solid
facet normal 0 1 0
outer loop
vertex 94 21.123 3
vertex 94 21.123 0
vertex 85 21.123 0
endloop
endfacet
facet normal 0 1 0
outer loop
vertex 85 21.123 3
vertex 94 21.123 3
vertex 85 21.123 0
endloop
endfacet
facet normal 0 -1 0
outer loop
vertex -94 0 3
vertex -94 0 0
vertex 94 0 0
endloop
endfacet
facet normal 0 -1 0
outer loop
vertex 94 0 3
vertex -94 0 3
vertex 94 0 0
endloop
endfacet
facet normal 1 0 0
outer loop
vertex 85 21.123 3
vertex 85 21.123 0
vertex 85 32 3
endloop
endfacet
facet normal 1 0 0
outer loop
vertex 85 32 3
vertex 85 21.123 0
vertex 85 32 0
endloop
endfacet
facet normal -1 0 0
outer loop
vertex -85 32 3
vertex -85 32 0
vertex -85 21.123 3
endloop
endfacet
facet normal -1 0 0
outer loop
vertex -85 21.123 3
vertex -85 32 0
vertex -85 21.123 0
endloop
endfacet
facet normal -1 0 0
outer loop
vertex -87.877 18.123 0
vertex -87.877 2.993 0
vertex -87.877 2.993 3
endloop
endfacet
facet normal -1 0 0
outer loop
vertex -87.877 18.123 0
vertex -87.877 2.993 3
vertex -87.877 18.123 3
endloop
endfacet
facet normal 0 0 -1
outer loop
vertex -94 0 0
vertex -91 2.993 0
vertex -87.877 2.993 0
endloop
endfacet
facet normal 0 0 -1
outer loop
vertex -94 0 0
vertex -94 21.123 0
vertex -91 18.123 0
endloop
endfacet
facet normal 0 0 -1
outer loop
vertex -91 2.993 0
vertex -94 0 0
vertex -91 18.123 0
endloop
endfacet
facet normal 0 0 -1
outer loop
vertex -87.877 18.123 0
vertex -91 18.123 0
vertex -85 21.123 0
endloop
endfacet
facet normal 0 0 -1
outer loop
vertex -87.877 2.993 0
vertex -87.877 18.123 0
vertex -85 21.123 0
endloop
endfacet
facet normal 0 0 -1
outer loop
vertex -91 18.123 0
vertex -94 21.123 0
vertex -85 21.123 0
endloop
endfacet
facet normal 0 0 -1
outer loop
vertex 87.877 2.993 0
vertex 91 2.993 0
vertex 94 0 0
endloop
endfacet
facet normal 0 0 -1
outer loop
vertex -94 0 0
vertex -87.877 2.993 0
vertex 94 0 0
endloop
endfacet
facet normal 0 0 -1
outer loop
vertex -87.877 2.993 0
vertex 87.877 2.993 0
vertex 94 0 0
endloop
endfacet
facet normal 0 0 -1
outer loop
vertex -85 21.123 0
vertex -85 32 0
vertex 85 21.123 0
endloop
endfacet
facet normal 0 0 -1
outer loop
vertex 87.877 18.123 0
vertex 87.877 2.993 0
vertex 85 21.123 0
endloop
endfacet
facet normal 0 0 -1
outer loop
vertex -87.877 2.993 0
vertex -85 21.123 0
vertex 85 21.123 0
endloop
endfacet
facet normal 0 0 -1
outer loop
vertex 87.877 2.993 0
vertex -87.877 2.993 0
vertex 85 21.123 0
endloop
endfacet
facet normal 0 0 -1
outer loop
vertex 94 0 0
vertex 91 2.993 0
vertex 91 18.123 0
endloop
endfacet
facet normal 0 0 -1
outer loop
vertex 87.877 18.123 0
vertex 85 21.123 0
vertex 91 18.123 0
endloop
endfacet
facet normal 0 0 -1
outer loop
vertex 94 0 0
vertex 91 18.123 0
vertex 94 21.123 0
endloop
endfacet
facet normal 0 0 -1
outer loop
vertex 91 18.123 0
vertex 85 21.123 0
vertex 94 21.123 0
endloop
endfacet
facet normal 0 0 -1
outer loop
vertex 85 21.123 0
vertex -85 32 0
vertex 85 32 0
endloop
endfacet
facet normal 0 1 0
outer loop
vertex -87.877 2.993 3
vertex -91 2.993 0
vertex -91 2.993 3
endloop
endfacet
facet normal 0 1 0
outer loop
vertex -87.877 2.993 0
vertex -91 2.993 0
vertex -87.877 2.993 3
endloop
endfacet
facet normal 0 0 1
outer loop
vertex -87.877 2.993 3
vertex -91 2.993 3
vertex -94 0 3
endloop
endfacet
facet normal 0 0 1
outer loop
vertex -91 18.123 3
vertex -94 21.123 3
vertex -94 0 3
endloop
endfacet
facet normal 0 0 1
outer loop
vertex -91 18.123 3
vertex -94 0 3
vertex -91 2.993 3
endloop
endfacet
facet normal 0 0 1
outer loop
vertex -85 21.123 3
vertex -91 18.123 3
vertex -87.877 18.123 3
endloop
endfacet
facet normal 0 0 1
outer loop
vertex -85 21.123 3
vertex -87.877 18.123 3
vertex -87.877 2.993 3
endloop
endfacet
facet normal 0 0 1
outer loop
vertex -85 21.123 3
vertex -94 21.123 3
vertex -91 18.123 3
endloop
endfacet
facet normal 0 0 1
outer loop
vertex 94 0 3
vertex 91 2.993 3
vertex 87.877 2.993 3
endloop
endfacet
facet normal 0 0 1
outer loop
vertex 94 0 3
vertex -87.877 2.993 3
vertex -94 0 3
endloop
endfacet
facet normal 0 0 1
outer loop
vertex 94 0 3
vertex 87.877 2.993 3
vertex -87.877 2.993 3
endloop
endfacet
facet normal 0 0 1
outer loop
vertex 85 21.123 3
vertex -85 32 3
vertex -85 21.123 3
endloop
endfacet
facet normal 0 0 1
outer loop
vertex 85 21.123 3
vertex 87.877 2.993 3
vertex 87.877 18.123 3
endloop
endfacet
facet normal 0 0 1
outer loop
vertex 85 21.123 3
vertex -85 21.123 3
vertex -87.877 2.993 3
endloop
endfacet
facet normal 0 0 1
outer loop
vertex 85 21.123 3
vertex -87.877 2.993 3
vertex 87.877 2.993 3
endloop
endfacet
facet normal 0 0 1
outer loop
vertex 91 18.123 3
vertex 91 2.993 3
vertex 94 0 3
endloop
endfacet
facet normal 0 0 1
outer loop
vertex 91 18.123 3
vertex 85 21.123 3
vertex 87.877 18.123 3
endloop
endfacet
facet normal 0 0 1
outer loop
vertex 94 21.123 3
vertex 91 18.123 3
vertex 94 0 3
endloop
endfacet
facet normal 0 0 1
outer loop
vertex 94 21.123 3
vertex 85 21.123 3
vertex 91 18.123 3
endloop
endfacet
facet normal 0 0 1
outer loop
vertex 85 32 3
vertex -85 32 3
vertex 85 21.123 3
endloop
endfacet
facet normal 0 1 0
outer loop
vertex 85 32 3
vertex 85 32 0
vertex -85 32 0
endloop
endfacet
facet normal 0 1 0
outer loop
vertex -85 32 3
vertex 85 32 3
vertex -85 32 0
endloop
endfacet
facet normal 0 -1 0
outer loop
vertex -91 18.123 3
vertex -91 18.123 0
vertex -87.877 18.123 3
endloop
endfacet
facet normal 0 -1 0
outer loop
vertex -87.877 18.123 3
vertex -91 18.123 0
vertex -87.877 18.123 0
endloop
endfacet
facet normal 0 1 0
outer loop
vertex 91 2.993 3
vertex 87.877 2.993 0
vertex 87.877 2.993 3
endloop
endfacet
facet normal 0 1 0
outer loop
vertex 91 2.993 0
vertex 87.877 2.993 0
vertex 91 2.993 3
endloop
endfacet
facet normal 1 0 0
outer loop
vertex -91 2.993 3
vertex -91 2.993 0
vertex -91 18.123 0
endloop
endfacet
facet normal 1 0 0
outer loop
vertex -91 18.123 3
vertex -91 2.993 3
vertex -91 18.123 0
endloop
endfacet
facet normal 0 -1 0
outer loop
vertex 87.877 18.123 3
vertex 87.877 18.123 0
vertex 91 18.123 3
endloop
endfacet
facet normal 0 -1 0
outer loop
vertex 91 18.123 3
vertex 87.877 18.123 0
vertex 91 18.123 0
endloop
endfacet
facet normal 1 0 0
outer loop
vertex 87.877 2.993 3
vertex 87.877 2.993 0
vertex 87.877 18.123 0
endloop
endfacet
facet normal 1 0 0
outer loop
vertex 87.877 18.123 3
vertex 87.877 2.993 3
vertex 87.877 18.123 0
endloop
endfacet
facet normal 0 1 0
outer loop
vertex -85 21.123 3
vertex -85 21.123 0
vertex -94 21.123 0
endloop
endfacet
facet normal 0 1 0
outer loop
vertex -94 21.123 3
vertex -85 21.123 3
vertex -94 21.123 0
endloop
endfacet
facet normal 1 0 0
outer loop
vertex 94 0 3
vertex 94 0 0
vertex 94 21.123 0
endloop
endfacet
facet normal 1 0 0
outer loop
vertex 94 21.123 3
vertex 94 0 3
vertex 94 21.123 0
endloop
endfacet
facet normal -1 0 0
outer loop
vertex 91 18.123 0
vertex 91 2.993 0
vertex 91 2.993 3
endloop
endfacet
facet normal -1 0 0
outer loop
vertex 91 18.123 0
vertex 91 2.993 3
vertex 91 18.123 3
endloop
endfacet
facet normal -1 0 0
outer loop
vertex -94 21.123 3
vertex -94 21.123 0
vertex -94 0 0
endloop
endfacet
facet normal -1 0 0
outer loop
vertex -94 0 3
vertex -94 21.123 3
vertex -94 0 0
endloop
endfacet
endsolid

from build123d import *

# Parameters (mm, degrees)
CROQUIS1_W              = 3.123
CROQUIS1_H              = 15.13
SALIENTE_EXTRUIR1_DEPTH = 3


with BuildPart() as part:
    # Croquis1 → Saliente-Extruir1 (new body)
    with BuildSketch(Plane.XY):
        Polygon((-94, 0), (94, 0), (94, 21.123), (85, 21.123), (85, 32), (-85, 32), (-85, 21.123), (-94, 21.123), align=None)
        with Locations((-89.4385, 10.558)):
            Rectangle(CROQUIS1_W, CROQUIS1_H, mode=Mode.SUBTRACT)
        with Locations((89.4385, 10.558)):
            Rectangle(CROQUIS1_W, CROQUIS1_H, mode=Mode.SUBTRACT)
    extrude(amount=SALIENTE_EXTRUIR1_DEPTH)


solid = part.part
